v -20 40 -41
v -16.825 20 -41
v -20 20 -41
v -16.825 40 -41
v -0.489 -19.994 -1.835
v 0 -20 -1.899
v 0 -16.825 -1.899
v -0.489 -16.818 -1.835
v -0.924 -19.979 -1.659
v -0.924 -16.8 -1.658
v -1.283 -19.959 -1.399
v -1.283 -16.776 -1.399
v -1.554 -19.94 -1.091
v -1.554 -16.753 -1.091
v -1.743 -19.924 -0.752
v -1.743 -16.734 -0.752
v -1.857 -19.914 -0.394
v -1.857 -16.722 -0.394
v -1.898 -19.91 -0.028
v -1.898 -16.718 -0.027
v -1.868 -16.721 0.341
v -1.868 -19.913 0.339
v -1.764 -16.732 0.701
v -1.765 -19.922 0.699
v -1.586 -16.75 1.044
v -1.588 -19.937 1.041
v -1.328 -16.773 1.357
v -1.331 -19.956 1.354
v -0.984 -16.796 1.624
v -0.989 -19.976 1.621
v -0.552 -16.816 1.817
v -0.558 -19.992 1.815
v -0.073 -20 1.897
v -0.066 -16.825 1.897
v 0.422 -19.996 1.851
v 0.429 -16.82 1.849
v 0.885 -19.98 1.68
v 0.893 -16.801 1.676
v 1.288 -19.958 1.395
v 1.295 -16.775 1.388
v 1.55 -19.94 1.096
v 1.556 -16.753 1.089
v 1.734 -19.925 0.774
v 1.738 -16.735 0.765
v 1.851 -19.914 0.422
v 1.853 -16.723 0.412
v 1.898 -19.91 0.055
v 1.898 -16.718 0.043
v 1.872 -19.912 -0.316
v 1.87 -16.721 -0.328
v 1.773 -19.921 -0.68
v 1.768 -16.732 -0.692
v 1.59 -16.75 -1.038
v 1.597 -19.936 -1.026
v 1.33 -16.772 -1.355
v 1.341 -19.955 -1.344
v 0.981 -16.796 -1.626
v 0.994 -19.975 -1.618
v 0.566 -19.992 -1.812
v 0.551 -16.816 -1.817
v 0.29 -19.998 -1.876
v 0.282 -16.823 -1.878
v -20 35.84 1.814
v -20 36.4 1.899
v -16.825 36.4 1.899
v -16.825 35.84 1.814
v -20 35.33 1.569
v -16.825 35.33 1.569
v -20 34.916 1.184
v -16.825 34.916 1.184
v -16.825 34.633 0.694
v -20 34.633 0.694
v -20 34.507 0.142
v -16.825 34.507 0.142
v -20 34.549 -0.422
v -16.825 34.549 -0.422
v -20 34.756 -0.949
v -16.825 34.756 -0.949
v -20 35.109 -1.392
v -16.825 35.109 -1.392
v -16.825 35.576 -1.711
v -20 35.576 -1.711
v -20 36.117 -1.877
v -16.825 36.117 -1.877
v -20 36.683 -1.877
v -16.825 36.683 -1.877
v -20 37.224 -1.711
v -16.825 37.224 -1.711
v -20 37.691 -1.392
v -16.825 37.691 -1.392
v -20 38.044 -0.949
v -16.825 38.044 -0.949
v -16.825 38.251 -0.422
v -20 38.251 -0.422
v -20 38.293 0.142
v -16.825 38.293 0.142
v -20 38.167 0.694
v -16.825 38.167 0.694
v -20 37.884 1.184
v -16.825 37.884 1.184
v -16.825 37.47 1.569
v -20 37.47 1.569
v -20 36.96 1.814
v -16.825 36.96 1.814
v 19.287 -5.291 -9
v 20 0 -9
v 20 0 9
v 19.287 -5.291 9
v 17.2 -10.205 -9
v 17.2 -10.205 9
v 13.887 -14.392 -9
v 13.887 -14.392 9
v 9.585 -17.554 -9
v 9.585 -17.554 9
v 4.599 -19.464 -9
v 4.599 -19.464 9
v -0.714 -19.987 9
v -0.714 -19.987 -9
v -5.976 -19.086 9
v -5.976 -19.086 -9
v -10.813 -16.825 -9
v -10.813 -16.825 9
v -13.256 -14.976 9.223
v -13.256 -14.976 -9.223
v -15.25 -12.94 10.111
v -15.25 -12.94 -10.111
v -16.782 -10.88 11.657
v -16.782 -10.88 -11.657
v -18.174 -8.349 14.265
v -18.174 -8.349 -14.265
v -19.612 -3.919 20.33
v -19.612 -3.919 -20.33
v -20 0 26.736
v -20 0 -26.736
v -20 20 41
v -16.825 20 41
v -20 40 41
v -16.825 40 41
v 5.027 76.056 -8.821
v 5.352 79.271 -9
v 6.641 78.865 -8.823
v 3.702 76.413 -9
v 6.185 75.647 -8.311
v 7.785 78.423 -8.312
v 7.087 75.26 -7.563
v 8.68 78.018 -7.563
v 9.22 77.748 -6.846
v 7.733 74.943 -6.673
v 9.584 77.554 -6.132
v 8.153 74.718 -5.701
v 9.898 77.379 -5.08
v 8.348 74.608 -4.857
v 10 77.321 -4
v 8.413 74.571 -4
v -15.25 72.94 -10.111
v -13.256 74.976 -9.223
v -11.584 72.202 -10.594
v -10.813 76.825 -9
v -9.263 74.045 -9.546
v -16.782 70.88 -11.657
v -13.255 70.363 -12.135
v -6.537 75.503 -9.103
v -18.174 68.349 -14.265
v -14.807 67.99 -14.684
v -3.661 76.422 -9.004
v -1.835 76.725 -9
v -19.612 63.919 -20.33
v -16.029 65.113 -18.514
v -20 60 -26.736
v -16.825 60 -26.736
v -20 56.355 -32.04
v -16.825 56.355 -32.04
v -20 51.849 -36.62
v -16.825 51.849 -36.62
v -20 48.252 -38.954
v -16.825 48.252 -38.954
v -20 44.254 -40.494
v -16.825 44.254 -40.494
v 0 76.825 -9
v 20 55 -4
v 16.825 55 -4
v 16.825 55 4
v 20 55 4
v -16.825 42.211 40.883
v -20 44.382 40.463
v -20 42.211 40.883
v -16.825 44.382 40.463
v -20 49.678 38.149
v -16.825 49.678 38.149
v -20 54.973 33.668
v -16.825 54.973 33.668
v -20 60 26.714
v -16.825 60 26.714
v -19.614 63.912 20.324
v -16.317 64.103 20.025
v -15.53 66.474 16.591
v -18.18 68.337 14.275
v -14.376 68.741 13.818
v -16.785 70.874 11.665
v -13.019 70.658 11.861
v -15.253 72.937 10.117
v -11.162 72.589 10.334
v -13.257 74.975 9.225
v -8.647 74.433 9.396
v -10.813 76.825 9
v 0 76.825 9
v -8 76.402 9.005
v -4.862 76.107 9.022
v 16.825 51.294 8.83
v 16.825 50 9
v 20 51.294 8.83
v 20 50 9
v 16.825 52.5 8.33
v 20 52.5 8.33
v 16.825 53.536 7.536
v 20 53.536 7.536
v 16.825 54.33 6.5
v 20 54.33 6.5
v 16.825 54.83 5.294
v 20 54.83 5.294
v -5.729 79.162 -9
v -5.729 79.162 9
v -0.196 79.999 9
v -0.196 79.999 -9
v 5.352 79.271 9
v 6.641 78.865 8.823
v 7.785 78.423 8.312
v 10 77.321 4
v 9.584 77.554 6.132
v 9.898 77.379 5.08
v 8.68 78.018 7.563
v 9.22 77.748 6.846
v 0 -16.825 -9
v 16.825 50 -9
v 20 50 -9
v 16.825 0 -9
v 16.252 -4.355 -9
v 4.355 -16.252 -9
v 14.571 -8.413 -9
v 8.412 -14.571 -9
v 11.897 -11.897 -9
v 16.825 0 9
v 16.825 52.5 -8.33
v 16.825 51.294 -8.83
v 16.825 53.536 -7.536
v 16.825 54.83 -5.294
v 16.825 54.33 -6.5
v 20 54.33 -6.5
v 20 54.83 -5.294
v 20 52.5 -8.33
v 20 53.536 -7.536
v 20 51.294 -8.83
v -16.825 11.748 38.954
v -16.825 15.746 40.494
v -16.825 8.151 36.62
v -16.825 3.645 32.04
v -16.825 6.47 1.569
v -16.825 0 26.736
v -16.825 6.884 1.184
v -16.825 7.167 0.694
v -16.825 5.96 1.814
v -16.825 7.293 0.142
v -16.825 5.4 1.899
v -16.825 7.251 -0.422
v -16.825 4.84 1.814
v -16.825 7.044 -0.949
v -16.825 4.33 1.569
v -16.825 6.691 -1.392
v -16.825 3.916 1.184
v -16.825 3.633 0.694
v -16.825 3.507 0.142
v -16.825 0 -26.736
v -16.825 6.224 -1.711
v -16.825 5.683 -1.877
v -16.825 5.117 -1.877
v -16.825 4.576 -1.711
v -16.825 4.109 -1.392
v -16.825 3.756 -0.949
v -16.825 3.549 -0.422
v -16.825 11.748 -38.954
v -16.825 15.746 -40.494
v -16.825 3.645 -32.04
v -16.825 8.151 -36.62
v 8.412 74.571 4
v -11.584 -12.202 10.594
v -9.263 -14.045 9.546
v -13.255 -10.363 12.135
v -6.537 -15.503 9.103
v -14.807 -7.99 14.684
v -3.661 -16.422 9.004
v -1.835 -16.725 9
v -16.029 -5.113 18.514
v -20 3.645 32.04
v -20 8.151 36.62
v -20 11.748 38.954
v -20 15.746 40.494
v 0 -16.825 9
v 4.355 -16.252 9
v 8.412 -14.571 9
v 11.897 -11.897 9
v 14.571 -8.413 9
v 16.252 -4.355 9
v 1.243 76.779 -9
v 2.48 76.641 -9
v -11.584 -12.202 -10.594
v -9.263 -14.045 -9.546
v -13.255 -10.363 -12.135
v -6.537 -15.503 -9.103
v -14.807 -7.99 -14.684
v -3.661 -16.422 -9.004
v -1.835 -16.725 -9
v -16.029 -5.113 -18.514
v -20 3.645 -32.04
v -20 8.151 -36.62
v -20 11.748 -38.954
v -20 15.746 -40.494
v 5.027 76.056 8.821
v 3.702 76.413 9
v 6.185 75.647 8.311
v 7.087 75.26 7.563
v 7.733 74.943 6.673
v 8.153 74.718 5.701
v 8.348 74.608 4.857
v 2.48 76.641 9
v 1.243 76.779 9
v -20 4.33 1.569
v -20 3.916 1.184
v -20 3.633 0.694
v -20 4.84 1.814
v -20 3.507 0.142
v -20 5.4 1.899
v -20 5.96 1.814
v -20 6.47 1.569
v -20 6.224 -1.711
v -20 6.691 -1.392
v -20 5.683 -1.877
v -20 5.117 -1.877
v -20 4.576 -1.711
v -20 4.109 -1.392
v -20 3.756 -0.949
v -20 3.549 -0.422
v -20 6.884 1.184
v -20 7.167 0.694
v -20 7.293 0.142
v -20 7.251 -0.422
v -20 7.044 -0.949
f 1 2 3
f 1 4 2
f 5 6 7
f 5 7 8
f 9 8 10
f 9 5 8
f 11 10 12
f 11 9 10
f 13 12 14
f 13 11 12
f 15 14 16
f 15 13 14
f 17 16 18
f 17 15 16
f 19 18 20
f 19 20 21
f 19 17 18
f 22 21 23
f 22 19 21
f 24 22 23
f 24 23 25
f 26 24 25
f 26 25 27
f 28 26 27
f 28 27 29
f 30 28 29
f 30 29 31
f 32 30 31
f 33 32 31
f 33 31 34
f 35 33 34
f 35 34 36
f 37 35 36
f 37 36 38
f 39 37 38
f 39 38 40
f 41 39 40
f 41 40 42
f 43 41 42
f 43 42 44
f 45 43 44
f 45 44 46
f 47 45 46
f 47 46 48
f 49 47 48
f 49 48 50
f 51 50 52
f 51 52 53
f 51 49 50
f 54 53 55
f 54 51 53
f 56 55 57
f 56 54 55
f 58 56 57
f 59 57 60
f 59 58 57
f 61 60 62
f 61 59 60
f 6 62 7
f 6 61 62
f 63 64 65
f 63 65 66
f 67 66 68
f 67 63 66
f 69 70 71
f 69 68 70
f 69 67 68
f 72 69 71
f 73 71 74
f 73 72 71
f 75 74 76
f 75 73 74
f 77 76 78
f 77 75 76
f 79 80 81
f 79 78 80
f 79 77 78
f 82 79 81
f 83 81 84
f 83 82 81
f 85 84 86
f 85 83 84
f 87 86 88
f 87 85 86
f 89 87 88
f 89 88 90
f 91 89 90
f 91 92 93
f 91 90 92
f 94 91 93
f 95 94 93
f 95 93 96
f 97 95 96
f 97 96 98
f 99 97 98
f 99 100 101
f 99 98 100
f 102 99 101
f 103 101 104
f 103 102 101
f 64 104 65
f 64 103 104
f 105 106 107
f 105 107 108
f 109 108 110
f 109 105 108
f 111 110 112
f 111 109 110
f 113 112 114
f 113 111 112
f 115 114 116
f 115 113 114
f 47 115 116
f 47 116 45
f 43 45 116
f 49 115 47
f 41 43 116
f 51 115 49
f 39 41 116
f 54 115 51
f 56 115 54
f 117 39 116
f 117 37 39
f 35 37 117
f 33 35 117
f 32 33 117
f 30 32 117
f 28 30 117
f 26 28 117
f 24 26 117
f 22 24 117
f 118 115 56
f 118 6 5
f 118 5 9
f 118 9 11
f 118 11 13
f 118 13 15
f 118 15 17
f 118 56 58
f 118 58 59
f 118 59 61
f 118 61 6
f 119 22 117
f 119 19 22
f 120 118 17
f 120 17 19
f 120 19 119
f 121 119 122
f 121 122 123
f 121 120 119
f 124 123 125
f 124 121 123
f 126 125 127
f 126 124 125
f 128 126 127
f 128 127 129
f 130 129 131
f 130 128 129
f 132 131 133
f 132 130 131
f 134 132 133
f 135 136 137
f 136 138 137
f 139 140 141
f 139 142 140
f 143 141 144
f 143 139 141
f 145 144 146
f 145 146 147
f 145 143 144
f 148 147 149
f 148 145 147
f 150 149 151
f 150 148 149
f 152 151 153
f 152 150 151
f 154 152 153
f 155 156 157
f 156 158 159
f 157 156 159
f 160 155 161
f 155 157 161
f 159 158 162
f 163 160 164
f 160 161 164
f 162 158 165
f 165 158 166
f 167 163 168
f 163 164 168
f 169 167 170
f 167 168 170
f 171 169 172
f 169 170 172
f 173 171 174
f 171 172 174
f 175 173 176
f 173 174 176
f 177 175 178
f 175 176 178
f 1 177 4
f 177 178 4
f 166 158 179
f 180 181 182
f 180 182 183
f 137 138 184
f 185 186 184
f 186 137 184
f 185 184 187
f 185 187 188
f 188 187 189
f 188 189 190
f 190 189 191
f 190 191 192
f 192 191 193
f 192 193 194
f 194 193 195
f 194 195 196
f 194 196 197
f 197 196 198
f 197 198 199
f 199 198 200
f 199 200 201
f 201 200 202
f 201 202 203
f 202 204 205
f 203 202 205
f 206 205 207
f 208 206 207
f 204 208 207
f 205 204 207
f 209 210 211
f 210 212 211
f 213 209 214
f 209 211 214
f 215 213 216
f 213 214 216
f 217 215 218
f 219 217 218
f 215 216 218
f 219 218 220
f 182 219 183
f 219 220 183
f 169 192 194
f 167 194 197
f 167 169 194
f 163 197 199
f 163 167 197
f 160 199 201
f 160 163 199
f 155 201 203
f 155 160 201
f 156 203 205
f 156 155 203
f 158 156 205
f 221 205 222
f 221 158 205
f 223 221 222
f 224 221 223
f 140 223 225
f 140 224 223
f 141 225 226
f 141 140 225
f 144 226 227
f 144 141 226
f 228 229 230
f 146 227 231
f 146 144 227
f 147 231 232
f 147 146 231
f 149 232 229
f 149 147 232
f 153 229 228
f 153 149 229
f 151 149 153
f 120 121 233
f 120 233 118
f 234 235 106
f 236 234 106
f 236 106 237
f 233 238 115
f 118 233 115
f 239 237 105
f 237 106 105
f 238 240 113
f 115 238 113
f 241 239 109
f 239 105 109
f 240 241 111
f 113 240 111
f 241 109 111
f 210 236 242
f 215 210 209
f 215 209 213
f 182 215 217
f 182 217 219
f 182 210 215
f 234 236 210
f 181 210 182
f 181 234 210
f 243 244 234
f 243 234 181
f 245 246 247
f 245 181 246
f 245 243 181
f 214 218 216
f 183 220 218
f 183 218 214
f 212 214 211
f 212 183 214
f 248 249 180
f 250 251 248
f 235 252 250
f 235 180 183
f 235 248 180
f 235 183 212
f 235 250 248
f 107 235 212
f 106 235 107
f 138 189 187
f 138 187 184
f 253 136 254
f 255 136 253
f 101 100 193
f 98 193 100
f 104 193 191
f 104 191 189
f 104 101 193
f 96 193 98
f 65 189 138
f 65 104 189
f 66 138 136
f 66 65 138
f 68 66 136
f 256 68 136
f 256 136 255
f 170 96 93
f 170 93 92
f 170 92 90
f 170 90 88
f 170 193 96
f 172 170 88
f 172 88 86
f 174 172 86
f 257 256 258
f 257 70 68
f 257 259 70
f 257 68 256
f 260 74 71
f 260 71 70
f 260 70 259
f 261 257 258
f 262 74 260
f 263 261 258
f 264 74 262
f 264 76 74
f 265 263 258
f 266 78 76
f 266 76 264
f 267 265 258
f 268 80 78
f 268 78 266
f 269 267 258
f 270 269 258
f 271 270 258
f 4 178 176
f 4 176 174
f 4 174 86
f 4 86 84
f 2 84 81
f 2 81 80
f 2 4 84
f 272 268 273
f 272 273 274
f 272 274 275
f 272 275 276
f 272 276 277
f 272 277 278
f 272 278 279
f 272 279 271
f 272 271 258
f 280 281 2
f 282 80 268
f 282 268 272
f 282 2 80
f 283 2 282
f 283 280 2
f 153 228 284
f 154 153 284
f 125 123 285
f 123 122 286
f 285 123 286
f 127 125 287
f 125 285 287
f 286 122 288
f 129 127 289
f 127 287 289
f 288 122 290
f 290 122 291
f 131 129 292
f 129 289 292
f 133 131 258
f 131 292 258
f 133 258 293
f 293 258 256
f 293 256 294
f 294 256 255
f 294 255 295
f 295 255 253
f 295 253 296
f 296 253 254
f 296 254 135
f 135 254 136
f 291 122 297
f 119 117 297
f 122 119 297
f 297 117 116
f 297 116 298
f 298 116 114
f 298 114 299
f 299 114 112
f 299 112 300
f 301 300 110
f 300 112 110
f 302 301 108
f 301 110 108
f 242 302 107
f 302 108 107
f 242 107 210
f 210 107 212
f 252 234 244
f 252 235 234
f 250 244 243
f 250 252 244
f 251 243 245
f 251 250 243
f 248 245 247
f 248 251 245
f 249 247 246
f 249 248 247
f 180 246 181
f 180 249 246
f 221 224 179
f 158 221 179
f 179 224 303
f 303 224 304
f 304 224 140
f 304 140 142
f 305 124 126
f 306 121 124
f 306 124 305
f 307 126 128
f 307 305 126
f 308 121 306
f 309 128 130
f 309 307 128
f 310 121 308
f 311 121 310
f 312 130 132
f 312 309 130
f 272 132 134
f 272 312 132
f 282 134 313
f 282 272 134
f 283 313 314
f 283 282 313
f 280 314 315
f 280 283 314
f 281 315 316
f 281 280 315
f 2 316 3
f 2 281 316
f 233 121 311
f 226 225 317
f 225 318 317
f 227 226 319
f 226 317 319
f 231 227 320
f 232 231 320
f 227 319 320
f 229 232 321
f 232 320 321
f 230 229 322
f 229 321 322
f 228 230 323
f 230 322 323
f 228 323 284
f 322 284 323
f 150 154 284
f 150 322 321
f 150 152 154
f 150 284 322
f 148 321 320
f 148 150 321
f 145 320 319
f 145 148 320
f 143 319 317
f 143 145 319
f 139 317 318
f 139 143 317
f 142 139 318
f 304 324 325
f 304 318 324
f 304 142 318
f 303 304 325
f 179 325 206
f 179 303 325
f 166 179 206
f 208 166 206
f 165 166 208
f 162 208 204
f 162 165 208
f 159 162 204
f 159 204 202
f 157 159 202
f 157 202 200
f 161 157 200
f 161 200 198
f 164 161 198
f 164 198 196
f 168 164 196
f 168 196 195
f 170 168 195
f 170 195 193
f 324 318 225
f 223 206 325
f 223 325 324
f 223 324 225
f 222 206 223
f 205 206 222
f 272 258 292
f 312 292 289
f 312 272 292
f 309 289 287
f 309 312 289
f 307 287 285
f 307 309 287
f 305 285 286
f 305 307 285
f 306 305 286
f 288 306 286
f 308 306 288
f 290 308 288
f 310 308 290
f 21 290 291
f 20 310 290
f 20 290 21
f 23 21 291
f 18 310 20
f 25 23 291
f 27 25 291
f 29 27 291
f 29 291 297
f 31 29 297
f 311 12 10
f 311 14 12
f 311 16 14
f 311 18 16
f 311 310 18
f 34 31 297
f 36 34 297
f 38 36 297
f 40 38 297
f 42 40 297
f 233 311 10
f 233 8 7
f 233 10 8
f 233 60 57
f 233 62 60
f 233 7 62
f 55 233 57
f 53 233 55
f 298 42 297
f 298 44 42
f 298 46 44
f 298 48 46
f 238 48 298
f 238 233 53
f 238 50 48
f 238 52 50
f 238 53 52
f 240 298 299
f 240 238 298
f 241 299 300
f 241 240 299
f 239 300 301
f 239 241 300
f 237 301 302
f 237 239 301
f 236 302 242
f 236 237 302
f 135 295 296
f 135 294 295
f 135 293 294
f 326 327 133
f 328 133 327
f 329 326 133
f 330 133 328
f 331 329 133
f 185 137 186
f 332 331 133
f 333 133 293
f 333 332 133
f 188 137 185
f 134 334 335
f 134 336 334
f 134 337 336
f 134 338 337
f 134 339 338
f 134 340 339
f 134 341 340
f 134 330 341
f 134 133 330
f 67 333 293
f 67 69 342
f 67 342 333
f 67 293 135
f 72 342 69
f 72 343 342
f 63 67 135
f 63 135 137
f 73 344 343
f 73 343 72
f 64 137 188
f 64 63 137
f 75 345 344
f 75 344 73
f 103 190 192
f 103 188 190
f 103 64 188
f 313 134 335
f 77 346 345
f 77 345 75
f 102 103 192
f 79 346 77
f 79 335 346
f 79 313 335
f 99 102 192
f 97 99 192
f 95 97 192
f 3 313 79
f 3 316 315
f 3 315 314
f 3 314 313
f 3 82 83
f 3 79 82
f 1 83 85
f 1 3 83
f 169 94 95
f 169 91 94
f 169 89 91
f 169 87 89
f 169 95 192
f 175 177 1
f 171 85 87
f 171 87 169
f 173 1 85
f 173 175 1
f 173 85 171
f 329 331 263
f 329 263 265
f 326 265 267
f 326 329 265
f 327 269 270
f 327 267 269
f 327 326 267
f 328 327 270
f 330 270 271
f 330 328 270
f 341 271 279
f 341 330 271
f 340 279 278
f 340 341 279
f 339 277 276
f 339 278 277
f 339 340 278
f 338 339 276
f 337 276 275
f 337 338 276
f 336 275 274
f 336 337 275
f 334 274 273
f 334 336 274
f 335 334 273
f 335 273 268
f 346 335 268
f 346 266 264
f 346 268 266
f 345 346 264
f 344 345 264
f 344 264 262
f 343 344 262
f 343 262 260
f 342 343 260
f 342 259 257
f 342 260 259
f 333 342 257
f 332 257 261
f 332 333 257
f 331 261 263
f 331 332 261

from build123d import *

# Parameters (mm, degrees)
HAND_BAND_BODY_DEPTH      = 41
HAND_BAND_BODY_DEPTH_BACK = 41
BACK_HAND_BRACE_DEPTH     = 93.092344959
PALM_BAND_OUTLINE_W       = 32
PALM_BAND_OUTLINE_H       = 100
PALM_BAND_DEPTH           = 20
SKETCH3_R                 = 1.89865
F_6_BOTTOM_HOLE_DEPTH     = 10
SKETCH4_R                 = 1.89865
F_6_SIDE_HOLES_DEPTH      = 20
FILLET1_R                 = 5


# Read off the part's stored shape, not the designer's step: Palm Band
with BuildPart() as part:
    # Sketch1 → Hand Band Body (new, two sides: drawn at the far end of the back side and taken through both)
    with BuildSketch(Plane.XY.offset(-HAND_BAND_BODY_DEPTH_BACK)):
        with BuildLine():
            Line((-20, 0), (-20, 60))
            ThreePointArc((-20, 60), (-10, 77.320508076), (10, 77.320508076))
            Line((10, 77.320508076), (8.4125, 74.570877419))
            ThreePointArc((8.4125, 74.570877419), (-8.4125, 74.570877419), (-16.825, 60))
            Line((-16.825, 60), (-16.825, 0))
            ThreePointArc((-16.825, 0), (0, -16.825), (16.825, 0))
            Line((16.825, 0), (16.825, 55))
            Line((16.825, 55), (20, 55))
            Line((20, 55), (20, 0))
            ThreePointArc((20, 0), (0, -20), (-20, 0))
        make_face()
    extrude(amount=HAND_BAND_BODY_DEPTH + HAND_BAND_BODY_DEPTH_BACK)

    # Sketch2 → Back-Hand Brace (cut, through all)
    with BuildSketch(Plane(origin=(0, 0, 0), x_dir=(0, 0, -1), z_dir=(1, 0, 0))):
        with BuildLine():
            Line((41, 80), (9, 80))
            Line((9, 80), (9, 76.825))
            add(Edge.make_bspline(
                [(9, 76.825), (9, 76.683054398), (9, 73.844142348), (17.85340715, 63.039379279), (34.522211451, 58.42224391), (41, 44.67531916), (41, 40.222634246), (41, 40)],
                knots=[0, 0, 0, 0, 0.008269556, 0.165391112, 0.746027462, 0.987301373, 1, 1, 1, 1], degree=3))
            Line((41, 40), (41, 80))
        make_face()
        with BuildLine():
            Line((41, -20), (41, 20))
            add(Edge.make_bspline(
                [(9, -16.825), (9, -16.683054398), (9, -13.844142348), (17.85340715, -3.039379279), (34.522211451, 1.57775609), (41, 15.32468084), (41, 19.777365754), (41, 20)],
                knots=[0, 0, 0, 0, 0.008269556, 0.165391112, 0.746027462, 0.987301373, 1, 1, 1, 1], degree=3))
            Line((9, -16.825), (9, -20))
            Line((9, -20), (41, -20))
        make_face()
        with BuildLine():
            Line((-41, 80), (-41, 40))
            add(Edge.make_bspline(
                [(-41, 40), (-41, 40.223460634), (-41, 44.692673321), (-34.522211451, 58.40583885), (-17.85340715, 63.020392952), (-9, 73.856007673), (-9, 76.683619413), (-9, 76.825)],
                knots=[0, 0, 0, 0, 0.012698627, 0.253972538, 0.834608888, 0.991730444, 1, 1, 1, 1], degree=3))
            Line((-9, 76.825), (-9, 80))
            Line((-9, 80), (-41, 80))
        make_face()
        with BuildLine():
            add(Edge.make_bspline(
                [(-9, -16.825), (-9, -16.683054398), (-9, -13.844142348), (-17.85340715, -3.039379279), (-34.522211451, 1.57775609), (-41, 15.32468084), (-41, 19.777365754), (-41, 20)],
                knots=[0, 0, 0, 0, 0.008269556, 0.165391112, 0.746027462, 0.987301373, 1, 1, 1, 1], degree=3))
            Line((-41, 20), (-41, -20))
            Line((-41, -20), (-9, -20))
            Line((-9, -20), (-9, -16.825))
        make_face()
    extrude(amount=-BACK_HAND_BRACE_DEPTH, mode=Mode.SUBTRACT)

    # Palm Band outline → Palm Band (cut)
    with BuildSketch(Plane(origin=(0, 0, 0), x_dir=(0, 0, -1), z_dir=(1, 0, 0))):
        with Locations((-25, 30)):
            Rectangle(PALM_BAND_OUTLINE_W, PALM_BAND_OUTLINE_H)
        with Locations((25, 30)):
            Rectangle(PALM_BAND_OUTLINE_W, PALM_BAND_OUTLINE_H)
    extrude(amount=PALM_BAND_DEPTH, mode=Mode.SUBTRACT)

    # Sketch3 → #6 Bottom Hole (cut)
    with BuildSketch(Plane(origin=(0, -25, 0), x_dir=(-1, 0, 0), z_dir=(0, 1, 0))):
        with Locations(Location((0, 0, 0), (0, 0, 270))):
            Circle(SKETCH3_R)
    extrude(amount=F_6_BOTTOM_HOLE_DEPTH, mode=Mode.SUBTRACT)

    # Sketch4 → #6 Side Holes (cut)
    with BuildSketch(Plane(origin=(-25, 0, 0), x_dir=(0, 0, -1), z_dir=(1, 0, 0))):
        with Locations(Location((0, 36.4, 0), (0, 0, 180))):
            Circle(SKETCH4_R)
        with Locations(Location((0, 5.4, 0), (0, 0, 180))):
            Circle(SKETCH4_R)
    extrude(amount=F_6_SIDE_HOLES_DEPTH, mode=Mode.SUBTRACT)

    # Fillet1
    fillet1_edges = [part.edges().sort_by_distance(p)[0] for p in [
        (18.4125, 55, -9),
        (9.20625, 75.945692747, -9),
        (9.20625, 75.945692747, 9),
        (18.4125, 55, 9),
    ]]
    fillet(fillet1_edges, radius=FILLET1_R)


solid = part.part
